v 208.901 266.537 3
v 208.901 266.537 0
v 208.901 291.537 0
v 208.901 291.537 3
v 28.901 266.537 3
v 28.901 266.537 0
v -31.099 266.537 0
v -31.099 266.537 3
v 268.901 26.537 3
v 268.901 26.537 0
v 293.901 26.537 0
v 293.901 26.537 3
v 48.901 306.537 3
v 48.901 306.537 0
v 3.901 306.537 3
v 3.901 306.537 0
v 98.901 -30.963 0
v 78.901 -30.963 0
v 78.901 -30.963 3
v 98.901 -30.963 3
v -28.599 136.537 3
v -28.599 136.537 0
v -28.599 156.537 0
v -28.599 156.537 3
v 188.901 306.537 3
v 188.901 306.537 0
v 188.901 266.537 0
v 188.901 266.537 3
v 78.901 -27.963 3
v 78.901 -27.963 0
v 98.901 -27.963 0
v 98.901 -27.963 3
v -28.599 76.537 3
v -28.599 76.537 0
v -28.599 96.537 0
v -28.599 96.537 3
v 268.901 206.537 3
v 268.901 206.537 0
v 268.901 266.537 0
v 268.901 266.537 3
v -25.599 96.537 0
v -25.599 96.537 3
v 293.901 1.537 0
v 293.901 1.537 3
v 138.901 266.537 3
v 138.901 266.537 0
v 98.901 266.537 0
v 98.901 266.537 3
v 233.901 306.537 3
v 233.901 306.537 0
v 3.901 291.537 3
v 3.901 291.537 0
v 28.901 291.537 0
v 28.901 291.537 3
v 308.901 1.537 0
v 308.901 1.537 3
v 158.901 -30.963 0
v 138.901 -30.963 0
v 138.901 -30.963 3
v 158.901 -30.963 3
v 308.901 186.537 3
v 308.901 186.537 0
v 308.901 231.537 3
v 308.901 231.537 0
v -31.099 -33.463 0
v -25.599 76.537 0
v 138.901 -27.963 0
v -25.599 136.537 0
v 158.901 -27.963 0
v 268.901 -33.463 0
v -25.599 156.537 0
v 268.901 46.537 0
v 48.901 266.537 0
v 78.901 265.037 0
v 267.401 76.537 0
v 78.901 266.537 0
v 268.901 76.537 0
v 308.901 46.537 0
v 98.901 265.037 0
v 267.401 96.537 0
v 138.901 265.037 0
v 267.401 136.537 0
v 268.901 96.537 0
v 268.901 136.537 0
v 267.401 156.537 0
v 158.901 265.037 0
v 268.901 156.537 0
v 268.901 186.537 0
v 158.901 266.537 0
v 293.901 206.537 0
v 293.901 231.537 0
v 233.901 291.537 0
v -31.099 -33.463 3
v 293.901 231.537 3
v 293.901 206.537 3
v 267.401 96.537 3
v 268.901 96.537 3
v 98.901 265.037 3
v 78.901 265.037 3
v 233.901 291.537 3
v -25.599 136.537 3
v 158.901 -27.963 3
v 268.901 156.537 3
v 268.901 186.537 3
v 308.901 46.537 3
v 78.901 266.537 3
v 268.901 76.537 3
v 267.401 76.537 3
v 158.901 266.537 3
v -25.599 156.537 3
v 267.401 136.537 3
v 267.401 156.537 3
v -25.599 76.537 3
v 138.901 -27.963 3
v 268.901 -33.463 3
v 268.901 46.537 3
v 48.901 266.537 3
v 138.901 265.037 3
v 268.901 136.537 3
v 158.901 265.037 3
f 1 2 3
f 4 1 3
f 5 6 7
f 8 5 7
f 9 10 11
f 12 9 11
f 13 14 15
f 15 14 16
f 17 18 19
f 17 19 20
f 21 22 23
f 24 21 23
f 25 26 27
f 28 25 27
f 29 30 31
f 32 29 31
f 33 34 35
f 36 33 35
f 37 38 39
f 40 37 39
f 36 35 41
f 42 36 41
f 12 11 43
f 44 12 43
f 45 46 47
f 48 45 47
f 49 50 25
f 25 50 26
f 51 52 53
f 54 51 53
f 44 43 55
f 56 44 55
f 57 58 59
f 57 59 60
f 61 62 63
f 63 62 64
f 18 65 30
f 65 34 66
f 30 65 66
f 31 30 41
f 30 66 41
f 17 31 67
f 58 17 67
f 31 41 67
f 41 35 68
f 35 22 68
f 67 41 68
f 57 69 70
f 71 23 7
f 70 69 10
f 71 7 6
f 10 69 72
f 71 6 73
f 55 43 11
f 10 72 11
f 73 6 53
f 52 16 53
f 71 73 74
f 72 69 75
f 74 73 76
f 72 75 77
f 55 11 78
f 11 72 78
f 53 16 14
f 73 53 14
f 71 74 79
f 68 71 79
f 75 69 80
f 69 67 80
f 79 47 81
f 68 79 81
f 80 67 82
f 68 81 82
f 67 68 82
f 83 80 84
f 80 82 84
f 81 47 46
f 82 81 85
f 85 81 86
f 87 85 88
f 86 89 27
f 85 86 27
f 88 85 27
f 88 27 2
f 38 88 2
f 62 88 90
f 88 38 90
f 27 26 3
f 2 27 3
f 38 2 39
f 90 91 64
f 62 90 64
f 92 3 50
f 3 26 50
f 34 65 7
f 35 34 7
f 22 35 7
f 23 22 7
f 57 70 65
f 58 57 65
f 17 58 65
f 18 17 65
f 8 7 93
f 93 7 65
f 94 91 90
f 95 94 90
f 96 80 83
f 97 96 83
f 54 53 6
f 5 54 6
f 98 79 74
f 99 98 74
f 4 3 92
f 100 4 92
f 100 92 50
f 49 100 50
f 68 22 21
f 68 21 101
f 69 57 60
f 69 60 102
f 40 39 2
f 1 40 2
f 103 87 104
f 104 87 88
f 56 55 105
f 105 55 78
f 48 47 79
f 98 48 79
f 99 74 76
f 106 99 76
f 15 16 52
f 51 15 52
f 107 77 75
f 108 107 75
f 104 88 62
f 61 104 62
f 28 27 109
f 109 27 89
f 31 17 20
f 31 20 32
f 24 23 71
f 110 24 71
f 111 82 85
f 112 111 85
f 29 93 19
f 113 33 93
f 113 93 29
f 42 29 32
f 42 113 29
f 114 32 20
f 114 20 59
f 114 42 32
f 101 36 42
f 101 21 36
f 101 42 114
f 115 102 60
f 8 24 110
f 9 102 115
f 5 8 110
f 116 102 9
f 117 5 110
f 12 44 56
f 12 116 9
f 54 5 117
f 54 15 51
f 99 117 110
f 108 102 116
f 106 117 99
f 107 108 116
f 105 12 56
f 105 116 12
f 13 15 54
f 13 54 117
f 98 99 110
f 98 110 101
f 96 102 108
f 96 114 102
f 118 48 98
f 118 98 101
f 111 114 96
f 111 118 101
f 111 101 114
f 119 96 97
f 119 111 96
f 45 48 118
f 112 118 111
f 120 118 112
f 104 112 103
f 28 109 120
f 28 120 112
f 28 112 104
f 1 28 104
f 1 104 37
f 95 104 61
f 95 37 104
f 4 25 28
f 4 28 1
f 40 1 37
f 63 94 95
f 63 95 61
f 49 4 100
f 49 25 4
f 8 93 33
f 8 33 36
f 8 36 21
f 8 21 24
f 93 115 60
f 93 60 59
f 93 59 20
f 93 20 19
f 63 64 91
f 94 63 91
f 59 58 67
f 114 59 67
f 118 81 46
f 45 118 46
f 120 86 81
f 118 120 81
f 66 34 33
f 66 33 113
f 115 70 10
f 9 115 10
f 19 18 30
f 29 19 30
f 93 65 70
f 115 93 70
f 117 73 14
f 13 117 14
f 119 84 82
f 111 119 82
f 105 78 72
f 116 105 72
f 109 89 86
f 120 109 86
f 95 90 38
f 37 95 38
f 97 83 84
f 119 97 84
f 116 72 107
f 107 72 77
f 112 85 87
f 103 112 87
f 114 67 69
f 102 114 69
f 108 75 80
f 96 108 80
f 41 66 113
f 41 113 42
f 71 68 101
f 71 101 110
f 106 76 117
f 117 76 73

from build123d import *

# Parameters (mm, degrees)
ESBO_O1_W                = 20
ESBO_O1_H                = 3
ESBO_O1_W_2              = 3
ESBO_O1_H_2              = 20
RESSALTO_EXTRUS_O1_DEPTH = 3


with BuildPart() as part:
    # Esboço1 → Ressalto-extrusão1 (new body)
    with BuildSketch(Plane.XY):
        Polygon((208.901159766, 291.53692045), (233.901159766, 291.53692045), (233.901159766, 306.53692045), (188.901159766, 306.53692045), (188.901159766, 266.53692045), (158.901159766, 266.53692045), (158.901159766, 265.03692045), (138.901159766, 265.03692045), (138.901159766, 266.53692045), (98.901159766, 266.53692045), (98.901159766, 265.03692045), (78.901159766, 265.03692045), (78.901159766, 266.53692045), (48.901159766, 266.53692045), (48.901159766, 306.53692045), (3.901159766, 306.53692045), (3.901159766, 291.53692045), (28.901159766, 291.53692045), (28.901159766, 266.53692045), (-31.098840234, 266.53692045), (-31.098840234, -33.46307955), (268.901159766, -33.46307955), (268.901159766, 26.53692045), (293.901159766, 26.53692045), (293.901159766, 1.53692045), (308.901159766, 1.53692045), (308.901159766, 46.53692045), (268.901159766, 46.53692045), (268.901159766, 76.53692045), (267.401159766, 76.53692045), (267.401159766, 96.53692045), (268.901159766, 96.53692045), (268.901159766, 136.53692045), (267.401159766, 136.53692045), (267.401159766, 156.53692045), (268.901159766, 156.53692045), (268.901159766, 186.53692045), (308.901159766, 186.53692045), (308.901159766, 231.53692045), (293.901159766, 231.53692045), (293.901159766, 206.53692045), (268.901159766, 206.53692045), (268.901159766, 266.53692045), (208.901159766, 266.53692045), align=None)
        with Locations((88.901159766, -29.46307955)):
            Rectangle(ESBO_O1_W, ESBO_O1_H, mode=Mode.SUBTRACT)
        with Locations((148.901159766, -29.46307955)):
            Rectangle(ESBO_O1_W, ESBO_O1_H, mode=Mode.SUBTRACT)
        with Locations((-27.098840234, 146.53692045)):
            Rectangle(ESBO_O1_W_2, ESBO_O1_H_2, mode=Mode.SUBTRACT)
        with Locations((-27.098840234, 86.53692045)):
            Rectangle(ESBO_O1_W_2, ESBO_O1_H_2, mode=Mode.SUBTRACT)
    extrude(amount=RESSALTO_EXTRUS_O1_DEPTH)


solid = part.part
